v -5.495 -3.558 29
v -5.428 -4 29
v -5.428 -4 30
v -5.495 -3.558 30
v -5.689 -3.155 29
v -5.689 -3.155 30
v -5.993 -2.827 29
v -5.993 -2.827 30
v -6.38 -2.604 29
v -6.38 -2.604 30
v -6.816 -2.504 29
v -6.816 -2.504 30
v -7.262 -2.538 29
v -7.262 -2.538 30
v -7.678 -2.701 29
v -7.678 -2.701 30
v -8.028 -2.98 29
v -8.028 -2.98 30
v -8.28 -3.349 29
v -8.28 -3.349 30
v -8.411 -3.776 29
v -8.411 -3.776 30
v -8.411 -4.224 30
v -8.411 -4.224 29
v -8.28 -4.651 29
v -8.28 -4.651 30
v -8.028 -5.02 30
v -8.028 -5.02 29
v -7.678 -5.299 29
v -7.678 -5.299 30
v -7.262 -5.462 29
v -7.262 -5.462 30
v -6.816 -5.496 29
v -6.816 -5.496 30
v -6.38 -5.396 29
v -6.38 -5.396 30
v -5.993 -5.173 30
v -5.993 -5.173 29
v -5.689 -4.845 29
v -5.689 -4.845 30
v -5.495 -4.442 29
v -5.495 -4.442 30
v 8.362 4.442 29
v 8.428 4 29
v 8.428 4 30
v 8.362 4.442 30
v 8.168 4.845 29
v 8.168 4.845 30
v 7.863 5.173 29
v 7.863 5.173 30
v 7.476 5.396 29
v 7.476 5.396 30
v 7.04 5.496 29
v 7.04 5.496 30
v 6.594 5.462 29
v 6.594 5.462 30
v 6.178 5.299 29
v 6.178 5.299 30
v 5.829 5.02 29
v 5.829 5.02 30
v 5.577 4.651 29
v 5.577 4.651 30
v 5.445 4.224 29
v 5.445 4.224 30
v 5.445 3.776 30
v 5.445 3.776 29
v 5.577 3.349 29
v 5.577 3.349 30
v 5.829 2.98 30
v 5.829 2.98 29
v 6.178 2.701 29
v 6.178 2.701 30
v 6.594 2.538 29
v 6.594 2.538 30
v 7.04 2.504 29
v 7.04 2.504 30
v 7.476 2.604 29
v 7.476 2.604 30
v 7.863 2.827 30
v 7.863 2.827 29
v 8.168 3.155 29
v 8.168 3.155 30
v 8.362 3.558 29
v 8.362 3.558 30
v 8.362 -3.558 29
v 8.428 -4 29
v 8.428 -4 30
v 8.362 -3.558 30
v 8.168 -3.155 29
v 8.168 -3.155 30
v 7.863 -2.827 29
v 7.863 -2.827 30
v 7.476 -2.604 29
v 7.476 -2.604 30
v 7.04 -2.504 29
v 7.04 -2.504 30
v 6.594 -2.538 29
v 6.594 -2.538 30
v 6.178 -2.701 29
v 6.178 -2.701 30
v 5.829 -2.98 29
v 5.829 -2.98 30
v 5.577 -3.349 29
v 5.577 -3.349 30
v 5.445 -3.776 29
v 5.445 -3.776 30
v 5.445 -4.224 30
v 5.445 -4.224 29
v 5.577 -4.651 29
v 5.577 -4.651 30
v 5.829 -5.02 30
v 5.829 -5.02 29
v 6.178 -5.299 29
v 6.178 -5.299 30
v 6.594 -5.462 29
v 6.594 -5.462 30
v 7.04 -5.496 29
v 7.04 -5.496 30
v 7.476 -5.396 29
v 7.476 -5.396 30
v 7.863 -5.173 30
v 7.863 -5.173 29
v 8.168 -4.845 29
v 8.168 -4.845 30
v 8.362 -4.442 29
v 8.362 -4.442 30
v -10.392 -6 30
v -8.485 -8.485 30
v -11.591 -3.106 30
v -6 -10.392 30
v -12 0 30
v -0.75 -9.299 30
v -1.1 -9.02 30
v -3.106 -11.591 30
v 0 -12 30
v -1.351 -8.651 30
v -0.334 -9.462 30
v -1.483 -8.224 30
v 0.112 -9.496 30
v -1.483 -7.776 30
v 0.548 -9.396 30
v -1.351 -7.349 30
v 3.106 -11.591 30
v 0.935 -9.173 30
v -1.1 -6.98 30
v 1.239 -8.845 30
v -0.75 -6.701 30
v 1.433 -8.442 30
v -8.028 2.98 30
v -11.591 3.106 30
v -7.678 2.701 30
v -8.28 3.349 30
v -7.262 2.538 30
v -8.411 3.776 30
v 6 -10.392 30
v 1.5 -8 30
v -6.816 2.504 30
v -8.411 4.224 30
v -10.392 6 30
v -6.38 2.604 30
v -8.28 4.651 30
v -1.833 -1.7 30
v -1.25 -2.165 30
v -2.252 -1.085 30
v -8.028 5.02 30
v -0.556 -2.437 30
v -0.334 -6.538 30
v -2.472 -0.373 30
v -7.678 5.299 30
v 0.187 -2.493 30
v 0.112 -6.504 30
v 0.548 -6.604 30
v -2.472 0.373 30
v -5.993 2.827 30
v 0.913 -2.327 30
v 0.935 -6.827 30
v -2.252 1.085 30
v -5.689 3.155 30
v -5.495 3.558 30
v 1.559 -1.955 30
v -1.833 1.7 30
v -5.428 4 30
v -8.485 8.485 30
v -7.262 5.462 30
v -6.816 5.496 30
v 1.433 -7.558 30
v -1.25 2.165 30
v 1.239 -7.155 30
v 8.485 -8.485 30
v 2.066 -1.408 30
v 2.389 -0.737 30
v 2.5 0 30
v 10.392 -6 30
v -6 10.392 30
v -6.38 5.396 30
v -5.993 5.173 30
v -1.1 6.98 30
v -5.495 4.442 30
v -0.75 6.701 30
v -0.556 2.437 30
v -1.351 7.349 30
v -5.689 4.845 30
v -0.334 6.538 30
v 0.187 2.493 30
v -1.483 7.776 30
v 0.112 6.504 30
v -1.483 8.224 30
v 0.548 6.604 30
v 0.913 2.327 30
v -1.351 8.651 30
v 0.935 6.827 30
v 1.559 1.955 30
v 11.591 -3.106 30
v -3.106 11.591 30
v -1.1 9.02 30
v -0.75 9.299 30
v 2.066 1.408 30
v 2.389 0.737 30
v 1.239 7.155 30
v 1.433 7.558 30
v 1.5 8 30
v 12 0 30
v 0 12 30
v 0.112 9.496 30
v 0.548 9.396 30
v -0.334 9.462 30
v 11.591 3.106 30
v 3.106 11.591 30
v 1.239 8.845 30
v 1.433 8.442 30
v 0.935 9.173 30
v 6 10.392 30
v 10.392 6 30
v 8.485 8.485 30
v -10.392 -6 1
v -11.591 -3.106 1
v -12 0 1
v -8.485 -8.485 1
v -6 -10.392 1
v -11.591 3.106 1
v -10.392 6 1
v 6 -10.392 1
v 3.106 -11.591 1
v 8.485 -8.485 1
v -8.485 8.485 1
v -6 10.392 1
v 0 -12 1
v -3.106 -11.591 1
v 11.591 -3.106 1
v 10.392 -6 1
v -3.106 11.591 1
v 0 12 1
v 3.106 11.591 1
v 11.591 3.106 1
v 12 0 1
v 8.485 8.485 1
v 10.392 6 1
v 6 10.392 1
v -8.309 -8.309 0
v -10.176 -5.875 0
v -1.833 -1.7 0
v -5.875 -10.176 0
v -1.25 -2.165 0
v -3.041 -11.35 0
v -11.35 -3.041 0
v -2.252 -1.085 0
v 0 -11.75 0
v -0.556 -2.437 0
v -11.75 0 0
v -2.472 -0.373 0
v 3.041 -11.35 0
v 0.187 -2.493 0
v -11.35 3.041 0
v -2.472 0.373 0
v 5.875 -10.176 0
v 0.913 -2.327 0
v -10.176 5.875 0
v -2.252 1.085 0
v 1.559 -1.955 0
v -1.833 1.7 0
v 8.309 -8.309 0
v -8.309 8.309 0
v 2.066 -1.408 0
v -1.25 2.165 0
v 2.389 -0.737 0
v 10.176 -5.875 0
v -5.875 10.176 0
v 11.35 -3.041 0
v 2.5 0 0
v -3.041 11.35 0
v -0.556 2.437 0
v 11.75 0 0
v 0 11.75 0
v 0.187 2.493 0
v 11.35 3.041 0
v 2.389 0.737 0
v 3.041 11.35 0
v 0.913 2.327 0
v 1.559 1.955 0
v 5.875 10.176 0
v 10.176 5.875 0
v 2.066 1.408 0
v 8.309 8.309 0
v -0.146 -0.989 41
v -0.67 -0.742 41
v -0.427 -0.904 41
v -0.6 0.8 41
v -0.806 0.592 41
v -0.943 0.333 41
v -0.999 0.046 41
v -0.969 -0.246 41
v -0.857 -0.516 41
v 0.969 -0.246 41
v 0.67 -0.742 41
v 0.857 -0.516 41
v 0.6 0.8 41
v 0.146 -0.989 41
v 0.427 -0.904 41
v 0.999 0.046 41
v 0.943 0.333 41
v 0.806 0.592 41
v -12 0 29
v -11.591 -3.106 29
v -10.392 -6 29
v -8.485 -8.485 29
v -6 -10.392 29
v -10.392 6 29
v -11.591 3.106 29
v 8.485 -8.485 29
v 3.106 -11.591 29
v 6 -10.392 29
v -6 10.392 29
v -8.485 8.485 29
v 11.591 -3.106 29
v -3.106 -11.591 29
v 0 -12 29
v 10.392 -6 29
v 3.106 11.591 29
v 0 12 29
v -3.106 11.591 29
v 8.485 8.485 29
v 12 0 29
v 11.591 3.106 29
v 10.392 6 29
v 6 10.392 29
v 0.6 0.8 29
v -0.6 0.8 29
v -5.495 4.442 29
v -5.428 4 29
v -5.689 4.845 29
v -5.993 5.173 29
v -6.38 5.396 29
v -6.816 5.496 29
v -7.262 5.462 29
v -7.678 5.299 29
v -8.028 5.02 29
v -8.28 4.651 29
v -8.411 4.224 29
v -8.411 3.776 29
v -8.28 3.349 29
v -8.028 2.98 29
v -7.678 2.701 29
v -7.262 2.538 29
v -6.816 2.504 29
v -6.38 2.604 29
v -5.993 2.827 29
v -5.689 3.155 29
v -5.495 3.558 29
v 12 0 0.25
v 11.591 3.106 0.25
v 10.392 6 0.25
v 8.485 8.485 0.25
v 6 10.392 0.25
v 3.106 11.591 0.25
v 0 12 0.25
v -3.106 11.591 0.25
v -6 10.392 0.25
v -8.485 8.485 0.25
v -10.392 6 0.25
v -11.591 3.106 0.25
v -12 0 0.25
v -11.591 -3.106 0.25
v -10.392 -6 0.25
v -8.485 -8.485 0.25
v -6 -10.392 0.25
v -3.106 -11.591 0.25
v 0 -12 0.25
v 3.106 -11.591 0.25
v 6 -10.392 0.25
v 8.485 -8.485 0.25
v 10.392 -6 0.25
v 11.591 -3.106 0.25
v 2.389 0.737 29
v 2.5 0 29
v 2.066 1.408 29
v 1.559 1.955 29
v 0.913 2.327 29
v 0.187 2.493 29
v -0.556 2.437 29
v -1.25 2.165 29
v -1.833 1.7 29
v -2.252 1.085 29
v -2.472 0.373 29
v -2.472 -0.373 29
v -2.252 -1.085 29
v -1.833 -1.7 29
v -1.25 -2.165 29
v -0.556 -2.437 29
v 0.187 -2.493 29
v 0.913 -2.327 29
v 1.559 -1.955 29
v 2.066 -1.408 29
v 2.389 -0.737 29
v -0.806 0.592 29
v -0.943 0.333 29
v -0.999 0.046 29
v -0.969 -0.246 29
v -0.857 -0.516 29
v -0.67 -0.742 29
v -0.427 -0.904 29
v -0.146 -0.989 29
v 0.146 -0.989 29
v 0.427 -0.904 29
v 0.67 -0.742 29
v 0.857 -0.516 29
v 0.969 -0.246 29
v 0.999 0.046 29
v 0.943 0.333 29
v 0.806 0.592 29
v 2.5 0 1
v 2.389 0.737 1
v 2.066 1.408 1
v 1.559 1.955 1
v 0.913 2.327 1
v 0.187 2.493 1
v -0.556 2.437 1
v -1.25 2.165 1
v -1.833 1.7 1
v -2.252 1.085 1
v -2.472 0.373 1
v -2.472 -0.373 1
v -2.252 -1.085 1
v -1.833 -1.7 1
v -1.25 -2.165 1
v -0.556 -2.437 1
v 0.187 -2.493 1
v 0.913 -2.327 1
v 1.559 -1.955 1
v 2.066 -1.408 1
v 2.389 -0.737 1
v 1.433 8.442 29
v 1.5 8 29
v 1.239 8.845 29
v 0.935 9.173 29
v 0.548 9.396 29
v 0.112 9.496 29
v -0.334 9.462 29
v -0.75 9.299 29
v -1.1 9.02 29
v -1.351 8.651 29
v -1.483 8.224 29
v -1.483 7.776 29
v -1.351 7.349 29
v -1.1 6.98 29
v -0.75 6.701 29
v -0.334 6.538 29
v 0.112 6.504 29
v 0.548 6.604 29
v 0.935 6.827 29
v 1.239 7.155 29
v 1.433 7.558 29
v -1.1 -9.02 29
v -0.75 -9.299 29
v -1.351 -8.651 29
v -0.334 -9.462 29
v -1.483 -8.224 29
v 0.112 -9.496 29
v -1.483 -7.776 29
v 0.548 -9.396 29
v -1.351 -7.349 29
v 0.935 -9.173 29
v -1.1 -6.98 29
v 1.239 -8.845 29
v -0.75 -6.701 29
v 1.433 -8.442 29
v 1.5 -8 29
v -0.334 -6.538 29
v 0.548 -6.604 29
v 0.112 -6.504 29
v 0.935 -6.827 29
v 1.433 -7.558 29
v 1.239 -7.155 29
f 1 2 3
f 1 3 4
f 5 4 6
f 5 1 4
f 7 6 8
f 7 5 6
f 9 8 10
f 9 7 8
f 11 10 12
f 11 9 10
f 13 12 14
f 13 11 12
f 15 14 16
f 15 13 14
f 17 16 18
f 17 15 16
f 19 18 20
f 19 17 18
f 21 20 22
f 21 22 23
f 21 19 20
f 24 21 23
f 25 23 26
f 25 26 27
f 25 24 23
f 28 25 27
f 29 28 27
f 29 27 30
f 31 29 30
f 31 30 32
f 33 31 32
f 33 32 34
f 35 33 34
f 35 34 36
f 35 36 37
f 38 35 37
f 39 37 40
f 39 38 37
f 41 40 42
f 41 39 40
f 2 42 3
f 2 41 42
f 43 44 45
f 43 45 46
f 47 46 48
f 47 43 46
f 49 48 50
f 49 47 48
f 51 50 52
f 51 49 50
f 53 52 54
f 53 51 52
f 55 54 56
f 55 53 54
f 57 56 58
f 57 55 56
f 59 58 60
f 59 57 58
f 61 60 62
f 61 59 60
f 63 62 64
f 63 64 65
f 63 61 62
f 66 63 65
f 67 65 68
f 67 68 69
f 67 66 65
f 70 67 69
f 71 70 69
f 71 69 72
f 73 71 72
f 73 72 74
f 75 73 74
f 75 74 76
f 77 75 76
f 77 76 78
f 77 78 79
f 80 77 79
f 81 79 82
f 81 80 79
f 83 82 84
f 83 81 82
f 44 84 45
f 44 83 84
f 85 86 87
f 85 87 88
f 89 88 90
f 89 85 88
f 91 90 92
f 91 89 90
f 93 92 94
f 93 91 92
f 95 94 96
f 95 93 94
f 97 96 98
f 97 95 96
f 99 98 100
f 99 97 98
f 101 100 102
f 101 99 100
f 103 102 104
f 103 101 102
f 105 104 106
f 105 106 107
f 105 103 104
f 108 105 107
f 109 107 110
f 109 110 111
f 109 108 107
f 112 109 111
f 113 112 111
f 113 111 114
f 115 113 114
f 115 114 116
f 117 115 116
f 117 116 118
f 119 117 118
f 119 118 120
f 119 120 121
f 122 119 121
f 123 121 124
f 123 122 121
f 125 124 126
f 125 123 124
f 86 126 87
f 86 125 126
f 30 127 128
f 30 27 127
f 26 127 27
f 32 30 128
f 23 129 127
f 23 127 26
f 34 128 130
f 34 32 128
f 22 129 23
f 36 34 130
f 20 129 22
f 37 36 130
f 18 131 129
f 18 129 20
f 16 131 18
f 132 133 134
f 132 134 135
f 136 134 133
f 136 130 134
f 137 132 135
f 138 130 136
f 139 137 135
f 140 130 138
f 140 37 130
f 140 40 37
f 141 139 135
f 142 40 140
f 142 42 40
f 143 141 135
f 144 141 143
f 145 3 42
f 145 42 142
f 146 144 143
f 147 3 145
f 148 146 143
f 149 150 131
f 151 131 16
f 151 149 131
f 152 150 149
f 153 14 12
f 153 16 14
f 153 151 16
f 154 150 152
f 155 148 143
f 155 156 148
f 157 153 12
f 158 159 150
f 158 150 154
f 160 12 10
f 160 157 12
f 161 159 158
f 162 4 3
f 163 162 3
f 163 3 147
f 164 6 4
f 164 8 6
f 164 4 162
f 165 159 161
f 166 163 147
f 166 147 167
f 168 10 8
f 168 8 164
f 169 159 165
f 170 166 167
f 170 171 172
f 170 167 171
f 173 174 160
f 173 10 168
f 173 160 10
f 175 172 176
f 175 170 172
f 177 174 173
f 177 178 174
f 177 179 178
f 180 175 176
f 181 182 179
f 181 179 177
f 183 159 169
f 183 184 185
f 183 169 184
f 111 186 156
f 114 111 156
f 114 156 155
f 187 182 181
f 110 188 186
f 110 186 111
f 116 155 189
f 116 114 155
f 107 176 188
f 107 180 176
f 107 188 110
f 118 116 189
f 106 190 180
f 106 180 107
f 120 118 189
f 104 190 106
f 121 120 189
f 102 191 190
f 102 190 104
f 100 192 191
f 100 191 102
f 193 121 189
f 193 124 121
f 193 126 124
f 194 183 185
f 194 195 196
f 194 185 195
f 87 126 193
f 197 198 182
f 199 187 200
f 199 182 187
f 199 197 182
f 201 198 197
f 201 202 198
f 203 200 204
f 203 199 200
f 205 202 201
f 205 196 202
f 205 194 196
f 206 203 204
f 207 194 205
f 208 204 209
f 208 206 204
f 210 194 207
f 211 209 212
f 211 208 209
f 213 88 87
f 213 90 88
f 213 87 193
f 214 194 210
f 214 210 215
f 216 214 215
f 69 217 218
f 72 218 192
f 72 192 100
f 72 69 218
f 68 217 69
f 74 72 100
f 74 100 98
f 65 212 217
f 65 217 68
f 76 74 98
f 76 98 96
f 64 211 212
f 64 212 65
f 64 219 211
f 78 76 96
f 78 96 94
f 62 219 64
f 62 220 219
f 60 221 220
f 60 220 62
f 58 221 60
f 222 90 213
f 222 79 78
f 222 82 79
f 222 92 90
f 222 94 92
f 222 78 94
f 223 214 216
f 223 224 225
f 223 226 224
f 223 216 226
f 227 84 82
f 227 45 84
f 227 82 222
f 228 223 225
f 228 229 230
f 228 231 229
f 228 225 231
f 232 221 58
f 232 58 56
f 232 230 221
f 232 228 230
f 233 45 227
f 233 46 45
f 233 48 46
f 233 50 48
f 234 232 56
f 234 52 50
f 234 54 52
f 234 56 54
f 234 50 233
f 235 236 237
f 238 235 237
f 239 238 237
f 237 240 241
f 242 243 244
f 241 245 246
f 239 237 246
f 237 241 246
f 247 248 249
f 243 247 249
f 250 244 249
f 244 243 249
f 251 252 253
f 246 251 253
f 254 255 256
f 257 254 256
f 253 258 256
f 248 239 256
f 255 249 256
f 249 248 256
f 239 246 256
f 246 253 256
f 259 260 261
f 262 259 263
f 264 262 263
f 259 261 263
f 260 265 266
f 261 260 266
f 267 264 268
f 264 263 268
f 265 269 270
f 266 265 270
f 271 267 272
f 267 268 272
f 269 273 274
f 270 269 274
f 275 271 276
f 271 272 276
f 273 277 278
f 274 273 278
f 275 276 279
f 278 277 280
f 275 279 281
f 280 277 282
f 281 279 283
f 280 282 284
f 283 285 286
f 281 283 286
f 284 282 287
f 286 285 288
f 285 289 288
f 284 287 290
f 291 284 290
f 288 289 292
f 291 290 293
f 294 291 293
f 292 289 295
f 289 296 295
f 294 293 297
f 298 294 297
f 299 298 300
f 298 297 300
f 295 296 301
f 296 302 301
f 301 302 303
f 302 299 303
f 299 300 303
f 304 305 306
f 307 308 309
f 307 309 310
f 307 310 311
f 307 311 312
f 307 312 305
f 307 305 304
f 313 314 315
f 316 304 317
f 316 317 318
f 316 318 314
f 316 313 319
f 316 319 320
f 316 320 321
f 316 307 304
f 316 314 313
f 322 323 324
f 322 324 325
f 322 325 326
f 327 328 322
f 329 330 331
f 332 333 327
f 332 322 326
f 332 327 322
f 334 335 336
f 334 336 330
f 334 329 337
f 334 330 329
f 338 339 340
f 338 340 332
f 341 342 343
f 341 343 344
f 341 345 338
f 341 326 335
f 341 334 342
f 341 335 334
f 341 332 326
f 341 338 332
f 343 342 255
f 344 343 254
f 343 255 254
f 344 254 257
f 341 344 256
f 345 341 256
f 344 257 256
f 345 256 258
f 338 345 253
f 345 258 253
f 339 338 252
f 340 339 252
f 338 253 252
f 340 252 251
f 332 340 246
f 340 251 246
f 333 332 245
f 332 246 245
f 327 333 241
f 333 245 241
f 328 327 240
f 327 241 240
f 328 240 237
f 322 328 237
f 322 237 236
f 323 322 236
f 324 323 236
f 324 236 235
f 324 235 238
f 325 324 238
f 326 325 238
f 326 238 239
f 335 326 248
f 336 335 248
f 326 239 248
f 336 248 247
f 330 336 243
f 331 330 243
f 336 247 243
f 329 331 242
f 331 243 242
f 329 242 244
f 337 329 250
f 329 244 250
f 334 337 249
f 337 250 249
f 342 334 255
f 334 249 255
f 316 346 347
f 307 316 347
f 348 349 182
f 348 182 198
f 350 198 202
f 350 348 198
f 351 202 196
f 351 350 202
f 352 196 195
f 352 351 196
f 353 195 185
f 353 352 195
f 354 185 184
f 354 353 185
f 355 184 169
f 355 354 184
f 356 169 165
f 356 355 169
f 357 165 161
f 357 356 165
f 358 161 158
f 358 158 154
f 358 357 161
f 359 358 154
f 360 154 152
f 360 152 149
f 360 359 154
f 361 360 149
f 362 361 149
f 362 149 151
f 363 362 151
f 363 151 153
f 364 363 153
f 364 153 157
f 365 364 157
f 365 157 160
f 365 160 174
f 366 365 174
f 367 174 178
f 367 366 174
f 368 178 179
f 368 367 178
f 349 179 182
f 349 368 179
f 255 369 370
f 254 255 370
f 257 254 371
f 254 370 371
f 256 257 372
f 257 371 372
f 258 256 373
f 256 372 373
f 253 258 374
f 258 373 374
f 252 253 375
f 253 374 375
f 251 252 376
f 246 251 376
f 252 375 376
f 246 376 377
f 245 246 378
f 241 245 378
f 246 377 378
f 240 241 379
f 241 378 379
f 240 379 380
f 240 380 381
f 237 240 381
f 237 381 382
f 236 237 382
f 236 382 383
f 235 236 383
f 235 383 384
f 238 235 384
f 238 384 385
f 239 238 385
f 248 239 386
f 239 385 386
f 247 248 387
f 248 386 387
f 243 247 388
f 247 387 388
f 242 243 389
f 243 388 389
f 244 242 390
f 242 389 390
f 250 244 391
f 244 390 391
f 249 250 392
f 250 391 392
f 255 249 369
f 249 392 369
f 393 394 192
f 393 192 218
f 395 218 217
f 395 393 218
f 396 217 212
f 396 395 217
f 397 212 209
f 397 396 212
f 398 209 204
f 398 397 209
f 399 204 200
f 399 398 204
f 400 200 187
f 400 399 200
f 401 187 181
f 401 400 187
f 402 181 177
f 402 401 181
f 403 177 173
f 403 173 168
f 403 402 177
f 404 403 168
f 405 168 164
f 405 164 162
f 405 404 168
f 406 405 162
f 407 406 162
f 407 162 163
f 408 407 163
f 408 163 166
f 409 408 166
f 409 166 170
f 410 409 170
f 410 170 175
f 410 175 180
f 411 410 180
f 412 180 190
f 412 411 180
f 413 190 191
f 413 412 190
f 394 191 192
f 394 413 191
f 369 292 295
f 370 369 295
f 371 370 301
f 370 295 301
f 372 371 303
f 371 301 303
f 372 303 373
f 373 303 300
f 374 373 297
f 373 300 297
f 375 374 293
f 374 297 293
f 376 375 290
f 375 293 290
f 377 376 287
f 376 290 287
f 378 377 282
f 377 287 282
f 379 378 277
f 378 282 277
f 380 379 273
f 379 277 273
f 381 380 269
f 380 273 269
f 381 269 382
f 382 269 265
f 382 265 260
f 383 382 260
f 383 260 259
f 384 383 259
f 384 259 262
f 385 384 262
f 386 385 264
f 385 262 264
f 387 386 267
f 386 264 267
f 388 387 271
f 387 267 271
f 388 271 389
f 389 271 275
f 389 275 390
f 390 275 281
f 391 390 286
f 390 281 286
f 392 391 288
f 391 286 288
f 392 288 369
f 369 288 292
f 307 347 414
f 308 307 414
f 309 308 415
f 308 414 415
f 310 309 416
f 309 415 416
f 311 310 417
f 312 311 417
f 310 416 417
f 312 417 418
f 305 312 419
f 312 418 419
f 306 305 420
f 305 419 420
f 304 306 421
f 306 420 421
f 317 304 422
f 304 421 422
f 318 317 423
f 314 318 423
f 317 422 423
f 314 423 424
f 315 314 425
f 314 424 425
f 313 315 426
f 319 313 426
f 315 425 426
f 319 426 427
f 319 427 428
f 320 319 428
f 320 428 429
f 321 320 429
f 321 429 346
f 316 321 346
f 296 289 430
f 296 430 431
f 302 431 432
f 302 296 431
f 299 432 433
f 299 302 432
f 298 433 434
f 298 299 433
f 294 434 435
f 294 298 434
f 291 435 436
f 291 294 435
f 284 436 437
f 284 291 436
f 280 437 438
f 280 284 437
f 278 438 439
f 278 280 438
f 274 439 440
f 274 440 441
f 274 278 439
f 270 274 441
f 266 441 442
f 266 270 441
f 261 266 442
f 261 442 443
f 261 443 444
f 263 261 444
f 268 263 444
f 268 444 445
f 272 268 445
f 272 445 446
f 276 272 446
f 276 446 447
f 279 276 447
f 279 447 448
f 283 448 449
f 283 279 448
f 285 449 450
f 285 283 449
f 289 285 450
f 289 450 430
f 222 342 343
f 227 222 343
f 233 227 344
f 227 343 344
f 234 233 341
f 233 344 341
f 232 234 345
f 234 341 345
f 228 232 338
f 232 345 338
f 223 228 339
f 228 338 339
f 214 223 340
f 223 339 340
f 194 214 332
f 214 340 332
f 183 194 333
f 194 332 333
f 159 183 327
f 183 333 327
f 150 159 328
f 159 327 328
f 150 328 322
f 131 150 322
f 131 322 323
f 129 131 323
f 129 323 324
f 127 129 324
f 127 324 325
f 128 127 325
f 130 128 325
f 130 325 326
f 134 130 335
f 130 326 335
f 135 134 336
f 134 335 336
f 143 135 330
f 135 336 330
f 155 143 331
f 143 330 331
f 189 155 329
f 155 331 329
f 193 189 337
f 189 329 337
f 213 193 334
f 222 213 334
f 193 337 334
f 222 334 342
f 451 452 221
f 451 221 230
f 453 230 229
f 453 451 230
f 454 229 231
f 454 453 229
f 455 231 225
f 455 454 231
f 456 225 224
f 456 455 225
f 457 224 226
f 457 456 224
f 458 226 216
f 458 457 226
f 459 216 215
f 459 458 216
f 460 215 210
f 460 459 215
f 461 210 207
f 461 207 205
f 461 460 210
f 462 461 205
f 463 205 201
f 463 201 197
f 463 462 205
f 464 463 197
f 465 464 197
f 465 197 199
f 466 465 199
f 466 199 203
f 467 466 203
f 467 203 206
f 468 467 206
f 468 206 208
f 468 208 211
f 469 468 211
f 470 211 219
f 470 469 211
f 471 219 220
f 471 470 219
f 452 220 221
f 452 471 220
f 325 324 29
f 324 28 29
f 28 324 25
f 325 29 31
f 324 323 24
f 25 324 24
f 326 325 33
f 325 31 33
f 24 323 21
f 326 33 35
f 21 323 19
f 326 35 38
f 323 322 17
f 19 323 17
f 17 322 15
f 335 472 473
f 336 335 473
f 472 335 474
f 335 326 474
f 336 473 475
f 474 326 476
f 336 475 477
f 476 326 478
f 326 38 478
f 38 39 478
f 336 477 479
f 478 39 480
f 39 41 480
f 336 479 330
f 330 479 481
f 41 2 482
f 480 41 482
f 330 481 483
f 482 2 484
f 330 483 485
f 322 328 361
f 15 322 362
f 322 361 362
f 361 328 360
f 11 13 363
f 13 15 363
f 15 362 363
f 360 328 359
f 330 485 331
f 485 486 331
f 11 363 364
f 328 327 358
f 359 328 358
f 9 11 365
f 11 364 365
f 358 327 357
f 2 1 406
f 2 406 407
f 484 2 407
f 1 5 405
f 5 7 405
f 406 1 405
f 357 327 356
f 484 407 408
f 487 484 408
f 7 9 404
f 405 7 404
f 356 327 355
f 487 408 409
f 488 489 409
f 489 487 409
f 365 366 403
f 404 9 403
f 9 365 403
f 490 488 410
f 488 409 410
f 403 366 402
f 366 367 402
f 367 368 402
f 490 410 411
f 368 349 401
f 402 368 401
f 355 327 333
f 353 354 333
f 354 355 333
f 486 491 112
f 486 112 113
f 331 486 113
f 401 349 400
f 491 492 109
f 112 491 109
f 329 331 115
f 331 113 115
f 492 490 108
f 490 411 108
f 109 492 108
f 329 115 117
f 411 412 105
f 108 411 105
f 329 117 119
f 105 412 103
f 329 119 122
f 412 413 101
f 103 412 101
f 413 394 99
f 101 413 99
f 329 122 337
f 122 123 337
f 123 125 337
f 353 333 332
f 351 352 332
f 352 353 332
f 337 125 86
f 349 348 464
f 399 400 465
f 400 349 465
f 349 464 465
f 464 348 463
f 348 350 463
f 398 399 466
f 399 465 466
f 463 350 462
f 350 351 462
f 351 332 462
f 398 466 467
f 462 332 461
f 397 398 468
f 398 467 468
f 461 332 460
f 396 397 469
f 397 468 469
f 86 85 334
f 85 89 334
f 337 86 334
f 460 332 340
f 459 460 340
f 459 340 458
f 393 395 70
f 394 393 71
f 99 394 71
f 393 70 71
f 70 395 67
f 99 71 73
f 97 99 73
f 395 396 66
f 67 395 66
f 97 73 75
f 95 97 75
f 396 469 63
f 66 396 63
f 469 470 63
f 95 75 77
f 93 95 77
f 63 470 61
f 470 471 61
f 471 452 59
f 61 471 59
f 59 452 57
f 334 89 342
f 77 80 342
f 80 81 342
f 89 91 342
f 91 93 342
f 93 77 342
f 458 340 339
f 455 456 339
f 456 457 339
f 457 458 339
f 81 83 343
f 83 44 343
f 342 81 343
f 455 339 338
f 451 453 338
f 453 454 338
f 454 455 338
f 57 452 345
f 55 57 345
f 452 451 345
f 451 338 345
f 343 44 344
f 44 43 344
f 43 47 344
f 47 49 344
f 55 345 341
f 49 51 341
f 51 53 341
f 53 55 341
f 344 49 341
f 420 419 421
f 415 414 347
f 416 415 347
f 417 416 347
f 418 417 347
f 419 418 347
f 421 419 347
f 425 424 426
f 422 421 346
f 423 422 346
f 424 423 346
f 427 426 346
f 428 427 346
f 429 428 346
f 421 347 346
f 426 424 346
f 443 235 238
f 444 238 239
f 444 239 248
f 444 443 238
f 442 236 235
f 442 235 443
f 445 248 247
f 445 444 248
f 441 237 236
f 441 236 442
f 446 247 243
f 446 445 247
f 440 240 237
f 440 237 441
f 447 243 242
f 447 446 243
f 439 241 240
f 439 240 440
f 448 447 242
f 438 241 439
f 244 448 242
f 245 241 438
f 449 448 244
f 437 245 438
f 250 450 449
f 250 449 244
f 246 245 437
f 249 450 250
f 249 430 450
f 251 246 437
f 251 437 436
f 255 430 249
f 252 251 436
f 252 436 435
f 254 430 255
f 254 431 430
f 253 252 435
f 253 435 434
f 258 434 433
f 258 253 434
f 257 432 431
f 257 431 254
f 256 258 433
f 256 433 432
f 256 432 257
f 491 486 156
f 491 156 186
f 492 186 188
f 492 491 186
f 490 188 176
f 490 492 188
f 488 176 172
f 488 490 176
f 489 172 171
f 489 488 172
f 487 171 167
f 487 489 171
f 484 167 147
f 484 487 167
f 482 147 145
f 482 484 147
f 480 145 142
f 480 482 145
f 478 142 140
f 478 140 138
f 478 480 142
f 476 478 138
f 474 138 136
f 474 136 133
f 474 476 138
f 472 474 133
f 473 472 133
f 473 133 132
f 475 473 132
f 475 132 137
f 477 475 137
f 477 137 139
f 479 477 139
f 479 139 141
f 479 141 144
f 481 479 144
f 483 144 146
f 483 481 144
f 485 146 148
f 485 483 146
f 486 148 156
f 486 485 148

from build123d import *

# Parameters (mm, degrees)
F2_R     = 12
F2_R_2   = 1.5
F2_R_3   = 2.5
F3_DEPTH = 1
F4_START = 1
F4_DEPTH = 28
F5_START = 29
F5_DEPTH = 1
F6_START = 29
F6_DEPTH = 12
F7_SIZE  = 0.25


with BuildPart() as f3:
    # F2 (on Top) → F3 (new body)
    with BuildSketch(Plane.XY):
        Circle(F2_R)
        with Locations((-6.9282032303, -4)):
            Circle(F2_R_2, mode=Mode.SUBTRACT)
        with Locations((0, -8)):
            Circle(F2_R_2, mode=Mode.SUBTRACT)
        with Locations((6.9282032303, -4)):
            Circle(F2_R_2, mode=Mode.SUBTRACT)
        with Locations((-6.9282032303, 4)):
            Circle(F2_R_2, mode=Mode.SUBTRACT)
        Circle(F2_R_3, mode=Mode.SUBTRACT)
        with Locations((6.9282032303, 4)):
            Circle(F2_R_2, mode=Mode.SUBTRACT)
        with Locations((0, 8)):
            Circle(F2_R_2, mode=Mode.SUBTRACT)
        with Locations((-6.9282032303, 4)):
            Circle(F2_R_2)
        with Locations((-6.9282032303, -4)):
            Circle(F2_R_2)
        with Locations((0, -8)):
            Circle(F2_R_2)
        with Locations((6.9282032303, -4)):
            Circle(F2_R_2)
        with Locations((6.9282032303, 4)):
            Circle(F2_R_2)
        with Locations((0, 8)):
            Circle(F2_R_2)
    extrude(amount=F3_DEPTH)

    # F7
    f7_edges = [f3.edges().sort_by_distance(p)[0] for p in [
        (-12, 0, 0),
    ]]
    chamfer(f7_edges, length=F7_SIZE)


with BuildPart() as f4:
    # F2 (on Top) → F4 (new body)
    with BuildSketch(Plane.XY.offset(F4_START)):
        Circle(F2_R)
        with Locations((-6.9282032303, -4)):
            Circle(F2_R_2, mode=Mode.SUBTRACT)
        with Locations((0, -8)):
            Circle(F2_R_2, mode=Mode.SUBTRACT)
        with Locations((6.9282032303, -4)):
            Circle(F2_R_2, mode=Mode.SUBTRACT)
        with Locations((-6.9282032303, 4)):
            Circle(F2_R_2, mode=Mode.SUBTRACT)
        Circle(F2_R_3, mode=Mode.SUBTRACT)
        with Locations((6.9282032303, 4)):
            Circle(F2_R_2, mode=Mode.SUBTRACT)
        with Locations((0, 8)):
            Circle(F2_R_2, mode=Mode.SUBTRACT)
        Circle(F2_R_3)
        with BuildLine():
            ThreePointArc((0.6, 0.8), (0.894427191, 0.4472135955), (1, 0))
            ThreePointArc((1, 0), (-0.4472135955, -0.894427191), (-0.6, 0.8))
            ThreePointArc((-0.6, 0.8), (0, 1), (0.6, 0.8))
        make_face(mode=Mode.SUBTRACT)
        with Locations((-6.9282032303, -4)):
            Circle(F2_R_2)
        with Locations((0, -8)):
            Circle(F2_R_2)
        with Locations((6.9282032303, 4)):
            Circle(F2_R_2)
        with Locations((6.9282032303, -4)):
            Circle(F2_R_2)
        with Locations((0, 8)):
            Circle(F2_R_2)
        with Locations((-6.9282032303, 4)):
            Circle(F2_R_2)
        with BuildLine():
            ThreePointArc((-0.6, 0.8), (-0.4472135955, -0.894427191), (1, 0))
            ThreePointArc((1, 0), (0.894427191, 0.4472135955), (0.6, 0.8))
            Line((0.6, 0.8), (-0.6, 0.8))
        make_face()
        with BuildLine():
            Line((-0.6, 0.8), (0.6, 0.8))
            ThreePointArc((0.6, 0.8), (0, 1), (-0.6, 0.8))
        make_face()
    extrude(amount=F4_DEPTH)


with BuildPart() as f5:
    # F2 (on Top) → F5 (new body)
    with BuildSketch(Plane.XY.offset(F5_START)):
        Circle(F2_R)
        with Locations((-6.9282032303, -4)):
            Circle(F2_R_2, mode=Mode.SUBTRACT)
        with Locations((0, -8)):
            Circle(F2_R_2, mode=Mode.SUBTRACT)
        with Locations((6.9282032303, -4)):
            Circle(F2_R_2, mode=Mode.SUBTRACT)
        with Locations((-6.9282032303, 4)):
            Circle(F2_R_2, mode=Mode.SUBTRACT)
        Circle(F2_R_3, mode=Mode.SUBTRACT)
        with Locations((6.9282032303, 4)):
            Circle(F2_R_2, mode=Mode.SUBTRACT)
        with Locations((0, 8)):
            Circle(F2_R_2, mode=Mode.SUBTRACT)
    extrude(amount=F5_DEPTH)


with BuildPart() as f6:
    # F2 (on Top) → F6 (new body)
    with BuildSketch(Plane.XY.offset(F6_START)):
        with BuildLine():
            ThreePointArc((-0.6, 0.8), (-0.4472135955, -0.894427191), (1, 0))
            ThreePointArc((1, 0), (0.894427191, 0.4472135955), (0.6, 0.8))
            Line((0.6, 0.8), (-0.6, 0.8))
        make_face()
    extrude(amount=F6_DEPTH)


solid = Compound([f3.part, f4.part, f5.part, f6.part])
